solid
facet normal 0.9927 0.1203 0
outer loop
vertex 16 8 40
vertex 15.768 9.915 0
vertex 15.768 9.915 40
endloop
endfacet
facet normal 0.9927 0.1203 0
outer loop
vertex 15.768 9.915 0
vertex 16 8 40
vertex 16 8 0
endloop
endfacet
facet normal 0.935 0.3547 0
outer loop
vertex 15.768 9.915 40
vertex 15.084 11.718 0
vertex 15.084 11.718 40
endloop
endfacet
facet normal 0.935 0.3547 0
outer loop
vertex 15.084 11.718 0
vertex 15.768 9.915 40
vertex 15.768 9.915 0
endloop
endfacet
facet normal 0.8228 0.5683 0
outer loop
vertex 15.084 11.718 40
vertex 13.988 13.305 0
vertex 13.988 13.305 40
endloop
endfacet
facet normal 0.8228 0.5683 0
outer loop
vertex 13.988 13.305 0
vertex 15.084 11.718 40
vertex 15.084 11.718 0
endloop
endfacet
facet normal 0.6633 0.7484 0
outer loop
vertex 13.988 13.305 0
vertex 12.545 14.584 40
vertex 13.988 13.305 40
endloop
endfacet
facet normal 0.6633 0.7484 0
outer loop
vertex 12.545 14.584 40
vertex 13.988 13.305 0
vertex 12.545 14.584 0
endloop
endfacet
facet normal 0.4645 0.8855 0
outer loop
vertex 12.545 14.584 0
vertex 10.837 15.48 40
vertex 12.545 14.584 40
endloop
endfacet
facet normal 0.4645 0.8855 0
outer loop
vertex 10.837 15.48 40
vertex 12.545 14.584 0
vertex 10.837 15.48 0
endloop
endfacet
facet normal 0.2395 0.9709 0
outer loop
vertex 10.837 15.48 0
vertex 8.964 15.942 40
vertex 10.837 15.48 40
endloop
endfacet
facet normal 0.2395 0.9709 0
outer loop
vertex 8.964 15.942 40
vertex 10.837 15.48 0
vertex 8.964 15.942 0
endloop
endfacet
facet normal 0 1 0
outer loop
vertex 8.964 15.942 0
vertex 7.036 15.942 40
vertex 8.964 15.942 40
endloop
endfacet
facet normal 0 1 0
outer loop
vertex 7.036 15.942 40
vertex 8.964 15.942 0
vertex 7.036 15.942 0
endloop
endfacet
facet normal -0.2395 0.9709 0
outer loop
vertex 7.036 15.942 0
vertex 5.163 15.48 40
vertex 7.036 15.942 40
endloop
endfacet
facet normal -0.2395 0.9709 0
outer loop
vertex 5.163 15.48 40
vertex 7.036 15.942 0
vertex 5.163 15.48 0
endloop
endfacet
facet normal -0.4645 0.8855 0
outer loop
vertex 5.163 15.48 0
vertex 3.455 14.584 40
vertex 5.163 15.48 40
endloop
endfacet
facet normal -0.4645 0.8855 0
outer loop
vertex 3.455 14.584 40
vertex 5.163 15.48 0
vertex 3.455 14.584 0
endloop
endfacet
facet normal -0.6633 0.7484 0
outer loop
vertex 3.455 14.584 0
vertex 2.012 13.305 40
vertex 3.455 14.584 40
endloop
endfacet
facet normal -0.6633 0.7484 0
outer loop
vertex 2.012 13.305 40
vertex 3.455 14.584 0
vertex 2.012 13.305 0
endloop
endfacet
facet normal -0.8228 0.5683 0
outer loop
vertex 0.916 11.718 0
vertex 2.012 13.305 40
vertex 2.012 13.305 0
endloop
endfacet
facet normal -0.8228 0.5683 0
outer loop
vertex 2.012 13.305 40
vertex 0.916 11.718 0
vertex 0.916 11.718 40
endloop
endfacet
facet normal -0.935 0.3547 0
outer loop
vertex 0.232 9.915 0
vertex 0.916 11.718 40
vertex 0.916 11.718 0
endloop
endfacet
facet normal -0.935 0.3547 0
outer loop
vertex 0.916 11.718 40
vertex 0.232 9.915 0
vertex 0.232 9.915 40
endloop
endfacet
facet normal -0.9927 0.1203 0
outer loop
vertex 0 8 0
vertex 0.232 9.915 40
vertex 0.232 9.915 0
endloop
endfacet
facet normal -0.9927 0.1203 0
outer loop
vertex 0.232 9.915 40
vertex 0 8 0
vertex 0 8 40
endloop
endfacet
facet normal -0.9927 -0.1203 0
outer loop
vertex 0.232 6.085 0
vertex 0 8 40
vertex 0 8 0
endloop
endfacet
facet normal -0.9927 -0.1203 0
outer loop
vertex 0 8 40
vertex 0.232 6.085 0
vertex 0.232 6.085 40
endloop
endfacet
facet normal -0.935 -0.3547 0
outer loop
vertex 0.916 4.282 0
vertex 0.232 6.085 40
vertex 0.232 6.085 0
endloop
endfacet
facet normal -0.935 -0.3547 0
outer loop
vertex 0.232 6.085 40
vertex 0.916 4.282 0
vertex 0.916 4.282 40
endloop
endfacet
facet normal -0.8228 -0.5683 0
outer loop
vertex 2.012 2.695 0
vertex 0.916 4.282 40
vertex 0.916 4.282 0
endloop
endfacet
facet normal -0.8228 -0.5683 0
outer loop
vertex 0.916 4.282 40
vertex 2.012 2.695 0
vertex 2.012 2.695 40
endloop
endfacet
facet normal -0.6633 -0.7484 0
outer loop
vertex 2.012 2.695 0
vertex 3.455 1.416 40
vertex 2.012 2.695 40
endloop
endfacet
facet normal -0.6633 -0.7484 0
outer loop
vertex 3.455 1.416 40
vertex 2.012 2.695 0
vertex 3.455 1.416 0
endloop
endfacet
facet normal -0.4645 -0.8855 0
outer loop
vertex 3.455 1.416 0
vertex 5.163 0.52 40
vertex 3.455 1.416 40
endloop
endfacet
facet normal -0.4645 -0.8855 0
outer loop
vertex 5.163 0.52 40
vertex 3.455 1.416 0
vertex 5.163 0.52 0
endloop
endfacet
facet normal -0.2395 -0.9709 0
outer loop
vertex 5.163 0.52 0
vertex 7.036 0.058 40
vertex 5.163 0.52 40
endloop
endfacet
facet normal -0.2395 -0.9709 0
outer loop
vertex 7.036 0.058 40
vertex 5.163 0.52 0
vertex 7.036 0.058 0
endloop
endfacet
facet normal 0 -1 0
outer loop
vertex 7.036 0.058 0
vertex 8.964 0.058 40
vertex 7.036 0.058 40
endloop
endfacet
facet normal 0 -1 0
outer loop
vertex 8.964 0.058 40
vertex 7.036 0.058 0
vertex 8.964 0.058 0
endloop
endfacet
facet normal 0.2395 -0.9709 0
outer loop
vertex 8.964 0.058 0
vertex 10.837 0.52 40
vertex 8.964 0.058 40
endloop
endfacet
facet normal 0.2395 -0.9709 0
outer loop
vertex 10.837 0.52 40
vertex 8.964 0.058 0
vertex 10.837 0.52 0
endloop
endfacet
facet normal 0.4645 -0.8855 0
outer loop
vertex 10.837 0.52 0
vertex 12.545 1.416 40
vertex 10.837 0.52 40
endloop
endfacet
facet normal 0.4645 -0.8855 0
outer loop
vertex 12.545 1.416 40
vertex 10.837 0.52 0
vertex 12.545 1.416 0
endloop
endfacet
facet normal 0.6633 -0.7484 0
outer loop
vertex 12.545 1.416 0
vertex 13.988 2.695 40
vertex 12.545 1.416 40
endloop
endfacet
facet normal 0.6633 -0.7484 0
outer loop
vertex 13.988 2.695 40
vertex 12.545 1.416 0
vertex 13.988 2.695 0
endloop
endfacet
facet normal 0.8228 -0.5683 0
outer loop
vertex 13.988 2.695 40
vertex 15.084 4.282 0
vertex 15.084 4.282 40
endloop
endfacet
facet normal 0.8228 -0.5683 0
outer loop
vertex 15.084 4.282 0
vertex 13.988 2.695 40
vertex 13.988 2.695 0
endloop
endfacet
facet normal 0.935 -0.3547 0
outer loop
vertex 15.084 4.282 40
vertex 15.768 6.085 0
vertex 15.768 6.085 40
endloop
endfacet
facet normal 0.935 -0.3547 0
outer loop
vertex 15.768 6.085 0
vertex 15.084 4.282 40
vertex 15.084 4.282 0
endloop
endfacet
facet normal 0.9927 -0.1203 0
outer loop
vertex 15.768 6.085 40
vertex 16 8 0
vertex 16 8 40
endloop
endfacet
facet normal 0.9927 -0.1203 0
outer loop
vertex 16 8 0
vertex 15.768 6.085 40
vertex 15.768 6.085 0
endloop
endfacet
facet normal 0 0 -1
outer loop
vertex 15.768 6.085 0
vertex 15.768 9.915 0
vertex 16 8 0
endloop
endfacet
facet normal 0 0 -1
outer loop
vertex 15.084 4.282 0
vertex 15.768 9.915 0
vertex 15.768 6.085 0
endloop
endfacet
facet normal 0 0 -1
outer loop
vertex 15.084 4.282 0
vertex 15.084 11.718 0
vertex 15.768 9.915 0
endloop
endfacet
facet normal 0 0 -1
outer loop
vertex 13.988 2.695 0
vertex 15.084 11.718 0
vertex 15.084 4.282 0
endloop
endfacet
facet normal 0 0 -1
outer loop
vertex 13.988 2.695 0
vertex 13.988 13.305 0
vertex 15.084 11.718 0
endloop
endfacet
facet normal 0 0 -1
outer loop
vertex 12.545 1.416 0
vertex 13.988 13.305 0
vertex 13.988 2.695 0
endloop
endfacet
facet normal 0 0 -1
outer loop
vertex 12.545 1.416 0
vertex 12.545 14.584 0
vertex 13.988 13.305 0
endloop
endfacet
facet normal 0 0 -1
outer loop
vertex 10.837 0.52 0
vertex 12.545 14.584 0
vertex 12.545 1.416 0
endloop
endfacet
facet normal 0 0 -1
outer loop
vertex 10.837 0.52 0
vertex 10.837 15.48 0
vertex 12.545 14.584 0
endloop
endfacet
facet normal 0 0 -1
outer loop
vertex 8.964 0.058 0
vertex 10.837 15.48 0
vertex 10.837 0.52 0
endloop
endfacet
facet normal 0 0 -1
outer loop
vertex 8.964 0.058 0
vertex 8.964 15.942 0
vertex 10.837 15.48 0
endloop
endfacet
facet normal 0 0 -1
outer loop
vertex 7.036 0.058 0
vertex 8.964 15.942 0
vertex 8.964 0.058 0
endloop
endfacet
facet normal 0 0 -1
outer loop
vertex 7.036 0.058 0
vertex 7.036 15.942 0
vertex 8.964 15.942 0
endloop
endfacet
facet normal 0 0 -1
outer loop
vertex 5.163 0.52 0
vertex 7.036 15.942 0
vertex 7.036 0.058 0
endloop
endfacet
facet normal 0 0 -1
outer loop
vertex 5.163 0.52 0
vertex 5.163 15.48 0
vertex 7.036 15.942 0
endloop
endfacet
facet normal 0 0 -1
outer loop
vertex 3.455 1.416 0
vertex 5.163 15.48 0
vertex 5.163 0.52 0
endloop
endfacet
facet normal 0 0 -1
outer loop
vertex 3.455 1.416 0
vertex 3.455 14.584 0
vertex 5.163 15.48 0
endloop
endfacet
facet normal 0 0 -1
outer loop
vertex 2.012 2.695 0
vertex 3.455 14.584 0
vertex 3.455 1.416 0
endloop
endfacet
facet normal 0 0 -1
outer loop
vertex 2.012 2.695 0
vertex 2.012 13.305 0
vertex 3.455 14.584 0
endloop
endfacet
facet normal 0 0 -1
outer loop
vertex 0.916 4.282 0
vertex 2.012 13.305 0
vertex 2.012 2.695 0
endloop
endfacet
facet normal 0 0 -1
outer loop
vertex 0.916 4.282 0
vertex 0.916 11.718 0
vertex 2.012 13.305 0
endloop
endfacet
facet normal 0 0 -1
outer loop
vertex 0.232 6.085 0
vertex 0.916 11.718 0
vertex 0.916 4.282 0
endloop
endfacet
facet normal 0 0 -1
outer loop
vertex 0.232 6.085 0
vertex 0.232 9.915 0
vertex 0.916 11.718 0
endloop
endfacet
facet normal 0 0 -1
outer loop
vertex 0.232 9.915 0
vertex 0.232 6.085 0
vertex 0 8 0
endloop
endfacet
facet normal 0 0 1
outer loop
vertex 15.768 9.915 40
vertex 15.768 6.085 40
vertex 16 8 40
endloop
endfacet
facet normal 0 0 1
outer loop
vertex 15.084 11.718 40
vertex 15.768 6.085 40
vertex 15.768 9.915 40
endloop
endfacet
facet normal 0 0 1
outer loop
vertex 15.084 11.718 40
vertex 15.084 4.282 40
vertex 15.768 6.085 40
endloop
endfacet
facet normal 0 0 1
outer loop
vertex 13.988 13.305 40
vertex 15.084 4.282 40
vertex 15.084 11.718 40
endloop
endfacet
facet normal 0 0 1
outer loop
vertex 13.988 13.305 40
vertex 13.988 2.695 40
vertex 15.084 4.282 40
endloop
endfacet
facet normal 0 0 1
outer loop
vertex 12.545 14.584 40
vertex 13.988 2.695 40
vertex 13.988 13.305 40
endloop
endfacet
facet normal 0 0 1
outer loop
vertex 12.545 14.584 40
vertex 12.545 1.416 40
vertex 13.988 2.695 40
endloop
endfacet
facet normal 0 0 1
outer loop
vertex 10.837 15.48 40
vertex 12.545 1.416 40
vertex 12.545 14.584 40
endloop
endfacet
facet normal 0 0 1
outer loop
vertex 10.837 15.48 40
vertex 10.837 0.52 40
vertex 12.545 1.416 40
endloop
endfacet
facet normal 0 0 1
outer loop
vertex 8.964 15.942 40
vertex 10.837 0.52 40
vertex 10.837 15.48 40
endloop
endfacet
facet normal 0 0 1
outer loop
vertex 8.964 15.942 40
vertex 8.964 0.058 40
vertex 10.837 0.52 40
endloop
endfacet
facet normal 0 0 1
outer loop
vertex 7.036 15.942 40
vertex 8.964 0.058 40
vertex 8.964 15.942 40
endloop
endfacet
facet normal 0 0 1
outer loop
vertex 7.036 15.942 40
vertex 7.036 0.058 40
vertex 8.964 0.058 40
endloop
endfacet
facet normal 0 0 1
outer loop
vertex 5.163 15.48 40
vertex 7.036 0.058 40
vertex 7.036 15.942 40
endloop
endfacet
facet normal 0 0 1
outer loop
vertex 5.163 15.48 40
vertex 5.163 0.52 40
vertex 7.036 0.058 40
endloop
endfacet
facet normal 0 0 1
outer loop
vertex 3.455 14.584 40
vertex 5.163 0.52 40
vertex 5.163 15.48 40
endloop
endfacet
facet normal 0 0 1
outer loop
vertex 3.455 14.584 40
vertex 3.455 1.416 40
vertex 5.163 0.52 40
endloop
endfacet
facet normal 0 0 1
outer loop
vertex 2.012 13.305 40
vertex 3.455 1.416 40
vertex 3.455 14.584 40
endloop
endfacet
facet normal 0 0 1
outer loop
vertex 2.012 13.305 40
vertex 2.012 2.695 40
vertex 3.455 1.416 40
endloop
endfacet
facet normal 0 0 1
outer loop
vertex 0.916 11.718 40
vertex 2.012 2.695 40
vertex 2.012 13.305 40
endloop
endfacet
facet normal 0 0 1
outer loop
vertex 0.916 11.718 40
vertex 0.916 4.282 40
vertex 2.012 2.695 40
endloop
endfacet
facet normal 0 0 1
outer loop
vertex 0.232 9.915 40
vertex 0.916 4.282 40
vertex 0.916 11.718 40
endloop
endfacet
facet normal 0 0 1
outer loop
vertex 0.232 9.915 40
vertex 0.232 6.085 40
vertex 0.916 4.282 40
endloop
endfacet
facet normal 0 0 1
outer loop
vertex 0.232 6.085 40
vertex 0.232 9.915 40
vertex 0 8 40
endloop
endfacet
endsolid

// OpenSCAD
// file: rounding_cylinder_centered/rounding_cylinder_centered.scad
module rounding_cylinder_centered() {
    cylinder(h=40, r=8);
}

// call module when run directly
rounding_cylinder_centered();
// main file
// use modules
use <rounding_cylinder_centered/rounding_cylinder_centered.scad>

module rounding_cylinder() {
    translate(v=[8, 8, 0]) {
        rounding_cylinder_centered();
    }
}

// call module when run directly
rounding_cylinder();
